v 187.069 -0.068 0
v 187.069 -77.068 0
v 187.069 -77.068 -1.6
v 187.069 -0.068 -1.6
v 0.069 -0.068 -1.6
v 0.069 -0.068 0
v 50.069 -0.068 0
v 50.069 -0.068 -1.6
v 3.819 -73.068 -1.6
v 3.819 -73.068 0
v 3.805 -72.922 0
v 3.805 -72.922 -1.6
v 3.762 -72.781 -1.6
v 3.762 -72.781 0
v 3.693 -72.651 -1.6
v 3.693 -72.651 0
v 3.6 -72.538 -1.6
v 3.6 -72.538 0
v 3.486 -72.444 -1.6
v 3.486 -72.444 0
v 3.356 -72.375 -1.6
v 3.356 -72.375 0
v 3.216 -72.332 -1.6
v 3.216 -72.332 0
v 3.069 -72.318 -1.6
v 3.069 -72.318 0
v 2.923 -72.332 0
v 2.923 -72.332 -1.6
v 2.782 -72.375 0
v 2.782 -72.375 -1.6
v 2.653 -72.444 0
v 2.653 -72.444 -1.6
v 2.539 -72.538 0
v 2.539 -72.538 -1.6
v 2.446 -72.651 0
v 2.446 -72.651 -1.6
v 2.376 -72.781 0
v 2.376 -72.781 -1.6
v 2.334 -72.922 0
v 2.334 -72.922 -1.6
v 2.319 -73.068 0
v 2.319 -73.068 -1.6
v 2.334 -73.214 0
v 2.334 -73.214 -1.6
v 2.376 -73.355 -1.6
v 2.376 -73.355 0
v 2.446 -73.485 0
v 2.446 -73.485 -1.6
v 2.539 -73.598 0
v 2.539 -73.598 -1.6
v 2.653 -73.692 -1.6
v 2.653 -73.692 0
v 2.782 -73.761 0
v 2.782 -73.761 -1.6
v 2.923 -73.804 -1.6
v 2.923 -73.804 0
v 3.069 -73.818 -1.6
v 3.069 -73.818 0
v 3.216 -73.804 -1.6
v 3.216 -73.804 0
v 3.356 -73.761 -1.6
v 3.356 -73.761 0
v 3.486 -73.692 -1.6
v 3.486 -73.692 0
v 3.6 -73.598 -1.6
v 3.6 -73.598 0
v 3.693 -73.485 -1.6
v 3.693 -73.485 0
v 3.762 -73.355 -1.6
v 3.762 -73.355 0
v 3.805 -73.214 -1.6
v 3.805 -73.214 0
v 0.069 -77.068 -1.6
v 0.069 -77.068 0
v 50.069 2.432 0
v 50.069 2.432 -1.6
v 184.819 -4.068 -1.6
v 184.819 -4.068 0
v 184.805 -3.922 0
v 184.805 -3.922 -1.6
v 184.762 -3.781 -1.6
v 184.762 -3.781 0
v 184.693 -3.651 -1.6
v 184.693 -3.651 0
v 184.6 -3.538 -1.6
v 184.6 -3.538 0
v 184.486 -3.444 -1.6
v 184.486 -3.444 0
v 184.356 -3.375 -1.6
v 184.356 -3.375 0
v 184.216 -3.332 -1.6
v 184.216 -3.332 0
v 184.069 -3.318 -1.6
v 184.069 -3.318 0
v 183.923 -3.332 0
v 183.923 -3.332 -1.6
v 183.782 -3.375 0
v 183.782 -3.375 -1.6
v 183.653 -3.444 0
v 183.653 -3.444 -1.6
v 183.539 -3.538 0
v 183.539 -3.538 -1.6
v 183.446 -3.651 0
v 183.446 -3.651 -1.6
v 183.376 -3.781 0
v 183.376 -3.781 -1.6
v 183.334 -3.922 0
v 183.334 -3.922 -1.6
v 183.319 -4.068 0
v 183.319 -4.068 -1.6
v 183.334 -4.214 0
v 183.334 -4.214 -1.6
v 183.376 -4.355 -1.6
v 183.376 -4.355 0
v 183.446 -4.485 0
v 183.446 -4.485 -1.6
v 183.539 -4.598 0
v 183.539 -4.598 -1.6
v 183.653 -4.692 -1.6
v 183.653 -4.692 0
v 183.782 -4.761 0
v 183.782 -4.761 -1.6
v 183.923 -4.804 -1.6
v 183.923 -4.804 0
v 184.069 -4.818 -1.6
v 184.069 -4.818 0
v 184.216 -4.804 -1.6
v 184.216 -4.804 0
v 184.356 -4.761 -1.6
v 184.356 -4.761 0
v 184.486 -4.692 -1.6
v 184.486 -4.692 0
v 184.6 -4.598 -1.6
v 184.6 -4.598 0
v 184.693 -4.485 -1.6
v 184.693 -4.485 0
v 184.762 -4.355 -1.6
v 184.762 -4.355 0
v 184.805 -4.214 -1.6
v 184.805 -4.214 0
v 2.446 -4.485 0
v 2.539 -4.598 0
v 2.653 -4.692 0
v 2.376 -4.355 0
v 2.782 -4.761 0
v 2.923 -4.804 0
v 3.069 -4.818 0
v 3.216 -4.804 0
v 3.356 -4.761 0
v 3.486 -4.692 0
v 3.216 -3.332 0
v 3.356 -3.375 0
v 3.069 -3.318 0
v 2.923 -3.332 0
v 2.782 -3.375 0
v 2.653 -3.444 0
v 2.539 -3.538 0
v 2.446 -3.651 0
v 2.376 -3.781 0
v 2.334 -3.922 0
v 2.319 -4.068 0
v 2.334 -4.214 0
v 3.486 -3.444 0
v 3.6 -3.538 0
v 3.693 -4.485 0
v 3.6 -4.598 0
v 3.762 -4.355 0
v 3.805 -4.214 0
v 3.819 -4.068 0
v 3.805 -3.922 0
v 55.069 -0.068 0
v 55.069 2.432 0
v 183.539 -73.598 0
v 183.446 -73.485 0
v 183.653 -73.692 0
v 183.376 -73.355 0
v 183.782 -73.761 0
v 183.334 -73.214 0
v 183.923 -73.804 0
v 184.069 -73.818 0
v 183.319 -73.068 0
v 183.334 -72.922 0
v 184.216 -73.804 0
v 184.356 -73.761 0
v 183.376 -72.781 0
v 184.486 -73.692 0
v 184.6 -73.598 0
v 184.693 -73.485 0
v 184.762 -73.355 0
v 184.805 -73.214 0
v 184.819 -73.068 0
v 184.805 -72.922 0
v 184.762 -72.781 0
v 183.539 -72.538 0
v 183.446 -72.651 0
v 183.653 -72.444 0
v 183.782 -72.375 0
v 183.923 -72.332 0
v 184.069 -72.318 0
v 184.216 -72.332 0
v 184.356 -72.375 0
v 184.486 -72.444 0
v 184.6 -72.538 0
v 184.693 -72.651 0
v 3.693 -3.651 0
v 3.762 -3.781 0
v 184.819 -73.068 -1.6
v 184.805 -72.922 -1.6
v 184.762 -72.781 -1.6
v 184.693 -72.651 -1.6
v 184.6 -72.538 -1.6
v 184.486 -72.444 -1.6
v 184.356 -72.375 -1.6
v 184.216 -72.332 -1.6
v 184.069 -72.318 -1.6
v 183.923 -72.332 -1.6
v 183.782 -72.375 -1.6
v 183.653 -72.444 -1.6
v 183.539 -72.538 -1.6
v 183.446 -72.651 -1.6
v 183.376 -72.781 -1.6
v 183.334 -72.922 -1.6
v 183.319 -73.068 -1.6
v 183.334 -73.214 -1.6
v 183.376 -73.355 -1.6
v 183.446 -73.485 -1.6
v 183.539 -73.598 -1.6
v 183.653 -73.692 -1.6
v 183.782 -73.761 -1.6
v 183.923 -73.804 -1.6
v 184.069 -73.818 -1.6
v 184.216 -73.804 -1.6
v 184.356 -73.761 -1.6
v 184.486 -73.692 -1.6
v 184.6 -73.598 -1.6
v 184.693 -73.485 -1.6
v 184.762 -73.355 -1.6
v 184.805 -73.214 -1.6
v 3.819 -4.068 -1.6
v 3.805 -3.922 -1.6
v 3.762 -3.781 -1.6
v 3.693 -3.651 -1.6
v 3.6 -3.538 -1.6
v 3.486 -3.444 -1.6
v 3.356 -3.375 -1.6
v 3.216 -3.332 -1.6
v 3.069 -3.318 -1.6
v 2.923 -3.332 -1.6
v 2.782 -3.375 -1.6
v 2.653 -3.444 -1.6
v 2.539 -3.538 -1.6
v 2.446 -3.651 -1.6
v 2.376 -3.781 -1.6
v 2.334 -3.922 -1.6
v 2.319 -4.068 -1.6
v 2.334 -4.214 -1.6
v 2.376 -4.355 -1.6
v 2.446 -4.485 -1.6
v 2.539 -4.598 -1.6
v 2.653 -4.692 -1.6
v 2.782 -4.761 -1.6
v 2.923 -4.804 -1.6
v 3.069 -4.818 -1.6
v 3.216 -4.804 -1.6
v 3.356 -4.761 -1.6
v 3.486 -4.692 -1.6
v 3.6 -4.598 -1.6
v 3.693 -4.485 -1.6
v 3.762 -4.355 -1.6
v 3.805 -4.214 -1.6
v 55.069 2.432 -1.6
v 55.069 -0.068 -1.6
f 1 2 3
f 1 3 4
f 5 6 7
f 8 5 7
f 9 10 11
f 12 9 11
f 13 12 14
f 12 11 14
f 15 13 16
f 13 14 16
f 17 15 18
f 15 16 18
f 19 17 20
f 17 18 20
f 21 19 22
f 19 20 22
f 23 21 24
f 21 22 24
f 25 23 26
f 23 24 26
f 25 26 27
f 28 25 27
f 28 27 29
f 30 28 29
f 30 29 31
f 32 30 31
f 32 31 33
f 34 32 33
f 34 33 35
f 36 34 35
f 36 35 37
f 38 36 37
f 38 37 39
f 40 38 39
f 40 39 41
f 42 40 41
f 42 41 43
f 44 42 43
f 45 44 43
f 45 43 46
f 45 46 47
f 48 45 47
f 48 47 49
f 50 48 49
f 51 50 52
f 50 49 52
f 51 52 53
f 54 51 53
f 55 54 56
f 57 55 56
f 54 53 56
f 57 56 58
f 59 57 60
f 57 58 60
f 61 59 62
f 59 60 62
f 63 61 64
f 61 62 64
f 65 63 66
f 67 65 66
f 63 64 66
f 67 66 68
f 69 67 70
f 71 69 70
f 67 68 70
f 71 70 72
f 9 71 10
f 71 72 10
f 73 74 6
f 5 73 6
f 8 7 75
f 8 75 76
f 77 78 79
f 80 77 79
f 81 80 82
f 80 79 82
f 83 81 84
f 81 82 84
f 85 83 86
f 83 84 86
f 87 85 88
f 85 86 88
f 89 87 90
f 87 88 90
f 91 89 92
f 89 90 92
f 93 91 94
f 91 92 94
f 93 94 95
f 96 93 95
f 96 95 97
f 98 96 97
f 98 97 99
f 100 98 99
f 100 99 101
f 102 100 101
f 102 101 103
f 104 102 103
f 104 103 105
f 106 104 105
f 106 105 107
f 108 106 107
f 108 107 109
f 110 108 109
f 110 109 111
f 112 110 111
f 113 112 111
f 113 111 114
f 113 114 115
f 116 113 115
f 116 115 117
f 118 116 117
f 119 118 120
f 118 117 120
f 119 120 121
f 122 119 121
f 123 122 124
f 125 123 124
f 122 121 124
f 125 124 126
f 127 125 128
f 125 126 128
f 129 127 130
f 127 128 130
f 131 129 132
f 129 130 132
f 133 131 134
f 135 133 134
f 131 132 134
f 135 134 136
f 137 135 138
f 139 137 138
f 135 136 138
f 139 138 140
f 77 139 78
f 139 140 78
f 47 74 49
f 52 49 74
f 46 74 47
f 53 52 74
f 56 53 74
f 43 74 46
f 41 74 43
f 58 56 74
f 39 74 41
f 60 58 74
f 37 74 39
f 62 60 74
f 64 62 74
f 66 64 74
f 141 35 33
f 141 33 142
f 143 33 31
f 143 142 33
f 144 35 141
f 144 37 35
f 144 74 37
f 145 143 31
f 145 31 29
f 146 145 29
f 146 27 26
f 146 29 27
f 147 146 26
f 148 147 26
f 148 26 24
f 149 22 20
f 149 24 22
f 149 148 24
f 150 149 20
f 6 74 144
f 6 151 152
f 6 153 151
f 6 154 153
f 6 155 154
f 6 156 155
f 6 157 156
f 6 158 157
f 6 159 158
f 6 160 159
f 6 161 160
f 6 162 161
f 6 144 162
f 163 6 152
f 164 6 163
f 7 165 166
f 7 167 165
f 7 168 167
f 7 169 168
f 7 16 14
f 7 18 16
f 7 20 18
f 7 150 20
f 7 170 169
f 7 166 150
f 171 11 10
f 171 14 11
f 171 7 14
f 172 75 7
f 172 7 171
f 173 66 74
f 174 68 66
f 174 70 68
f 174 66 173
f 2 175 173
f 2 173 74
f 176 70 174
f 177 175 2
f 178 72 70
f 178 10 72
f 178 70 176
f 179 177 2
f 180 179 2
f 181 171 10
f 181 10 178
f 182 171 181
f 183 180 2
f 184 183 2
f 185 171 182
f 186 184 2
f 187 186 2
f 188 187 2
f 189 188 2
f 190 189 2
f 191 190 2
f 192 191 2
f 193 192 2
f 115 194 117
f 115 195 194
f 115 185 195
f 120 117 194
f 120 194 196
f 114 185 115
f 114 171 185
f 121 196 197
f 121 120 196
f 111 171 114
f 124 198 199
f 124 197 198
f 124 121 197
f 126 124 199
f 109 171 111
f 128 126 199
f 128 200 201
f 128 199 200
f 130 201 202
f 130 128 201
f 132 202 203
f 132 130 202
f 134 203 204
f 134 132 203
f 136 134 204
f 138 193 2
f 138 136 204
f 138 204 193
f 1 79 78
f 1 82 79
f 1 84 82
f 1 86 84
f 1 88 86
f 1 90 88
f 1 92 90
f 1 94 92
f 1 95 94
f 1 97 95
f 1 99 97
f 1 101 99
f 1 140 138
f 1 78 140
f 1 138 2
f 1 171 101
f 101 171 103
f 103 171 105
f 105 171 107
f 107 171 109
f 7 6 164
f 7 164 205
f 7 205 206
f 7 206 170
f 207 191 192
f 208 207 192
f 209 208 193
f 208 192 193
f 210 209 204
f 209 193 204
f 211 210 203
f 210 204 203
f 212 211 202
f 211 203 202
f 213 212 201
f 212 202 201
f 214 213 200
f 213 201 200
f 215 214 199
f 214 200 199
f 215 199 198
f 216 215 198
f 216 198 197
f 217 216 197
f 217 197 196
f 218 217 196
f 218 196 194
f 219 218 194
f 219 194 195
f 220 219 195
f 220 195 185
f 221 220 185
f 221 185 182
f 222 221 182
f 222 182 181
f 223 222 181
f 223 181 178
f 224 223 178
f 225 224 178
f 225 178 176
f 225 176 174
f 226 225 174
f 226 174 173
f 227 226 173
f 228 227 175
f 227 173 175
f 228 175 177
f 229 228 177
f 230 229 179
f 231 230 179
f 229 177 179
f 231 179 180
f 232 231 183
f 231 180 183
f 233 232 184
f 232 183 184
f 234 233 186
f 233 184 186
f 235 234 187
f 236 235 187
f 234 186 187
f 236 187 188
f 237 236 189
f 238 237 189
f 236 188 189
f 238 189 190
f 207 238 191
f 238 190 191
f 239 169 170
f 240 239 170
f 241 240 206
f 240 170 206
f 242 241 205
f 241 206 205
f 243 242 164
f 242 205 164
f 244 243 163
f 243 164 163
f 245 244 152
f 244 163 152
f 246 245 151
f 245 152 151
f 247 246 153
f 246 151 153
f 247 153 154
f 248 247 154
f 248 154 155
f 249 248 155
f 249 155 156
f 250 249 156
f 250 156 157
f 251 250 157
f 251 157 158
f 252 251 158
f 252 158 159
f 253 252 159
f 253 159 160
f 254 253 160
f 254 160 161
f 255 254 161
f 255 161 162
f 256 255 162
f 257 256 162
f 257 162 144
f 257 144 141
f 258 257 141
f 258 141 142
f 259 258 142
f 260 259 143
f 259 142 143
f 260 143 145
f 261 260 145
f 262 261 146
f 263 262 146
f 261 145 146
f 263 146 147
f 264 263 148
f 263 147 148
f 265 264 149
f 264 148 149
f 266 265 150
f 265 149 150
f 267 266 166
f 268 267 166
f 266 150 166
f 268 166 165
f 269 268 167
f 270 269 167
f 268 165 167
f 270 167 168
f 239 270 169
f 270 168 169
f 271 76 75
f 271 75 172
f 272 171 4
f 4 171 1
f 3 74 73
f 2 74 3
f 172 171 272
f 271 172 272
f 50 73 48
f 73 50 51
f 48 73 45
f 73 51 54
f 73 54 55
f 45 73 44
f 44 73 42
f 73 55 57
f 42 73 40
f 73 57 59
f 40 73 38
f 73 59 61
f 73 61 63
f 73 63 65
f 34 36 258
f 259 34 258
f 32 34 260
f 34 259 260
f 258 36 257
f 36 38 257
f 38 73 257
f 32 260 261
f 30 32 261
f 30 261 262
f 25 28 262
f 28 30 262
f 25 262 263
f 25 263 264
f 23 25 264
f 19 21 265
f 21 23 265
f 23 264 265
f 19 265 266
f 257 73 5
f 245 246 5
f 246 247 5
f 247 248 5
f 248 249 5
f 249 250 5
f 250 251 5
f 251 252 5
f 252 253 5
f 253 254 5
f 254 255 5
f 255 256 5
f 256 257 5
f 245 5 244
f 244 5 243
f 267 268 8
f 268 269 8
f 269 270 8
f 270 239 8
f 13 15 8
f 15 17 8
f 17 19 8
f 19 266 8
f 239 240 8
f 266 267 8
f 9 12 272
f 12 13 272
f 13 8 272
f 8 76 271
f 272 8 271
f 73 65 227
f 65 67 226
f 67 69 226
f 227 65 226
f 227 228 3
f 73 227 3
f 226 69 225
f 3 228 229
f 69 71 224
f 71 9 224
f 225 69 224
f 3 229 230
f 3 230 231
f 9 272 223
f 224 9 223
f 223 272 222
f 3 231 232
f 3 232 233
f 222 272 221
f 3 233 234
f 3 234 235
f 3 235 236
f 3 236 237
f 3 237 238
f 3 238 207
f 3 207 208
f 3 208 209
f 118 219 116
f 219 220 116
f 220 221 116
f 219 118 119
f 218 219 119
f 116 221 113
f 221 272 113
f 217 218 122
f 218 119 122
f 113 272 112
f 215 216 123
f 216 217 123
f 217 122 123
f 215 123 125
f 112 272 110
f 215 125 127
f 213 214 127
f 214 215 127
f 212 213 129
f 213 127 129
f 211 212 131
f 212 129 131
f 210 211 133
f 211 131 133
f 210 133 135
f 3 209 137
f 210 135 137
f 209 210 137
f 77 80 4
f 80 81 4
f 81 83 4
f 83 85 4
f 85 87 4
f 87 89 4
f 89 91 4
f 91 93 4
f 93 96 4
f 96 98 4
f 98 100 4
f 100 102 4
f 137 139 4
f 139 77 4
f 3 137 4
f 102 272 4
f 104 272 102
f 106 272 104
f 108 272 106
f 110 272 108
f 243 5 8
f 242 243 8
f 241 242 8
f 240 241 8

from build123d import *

# Parameters (mm, degrees)
KEEPOUTLAYER_W      = 186.9999816
KEEPOUTLAYER_H      = 76.9999984
EXTRUDE_1_DEPTH     = 1.6
VIAHOLELAYER_R      = 0.7499985
CUT_EXTRUDE_1_DEPTH = 2.6
SKETCH_2_W          = 5
SKETCH_2_H          = 1.6
EXTRUDE_3_DEPTH     = 2.5


with BuildPart() as part:
    # KeepOutLayer → Бобышка-Вытянуть1 (new body)
    with BuildSketch(Plane.XY):
        with Locations((93.56941662, -38.56797722)):
            Rectangle(KEEPOUTLAYER_W, KEEPOUTLAYER_H)
    extrude(amount=-EXTRUDE_1_DEPTH)

    # ViaHoleLayer → Вырез-Вытянуть1 (cut, through all)
    with BuildSketch(Plane.XY):
        with Locations((3.0693995, -73.06799966)):
            Circle(VIAHOLELAYER_R)
        with Locations((3.0693995, -4.0680005)):
            Circle(VIAHOLELAYER_R)
        with Locations((184.06940072, -73.06799966)):
            Circle(VIAHOLELAYER_R)
        with Locations((184.06940072, -4.0680005)):
            Circle(VIAHOLELAYER_R)
    extrude(amount=-CUT_EXTRUDE_1_DEPTH, mode=Mode.SUBTRACT)

    # Эскиз2 → Бобышка-Вытянуть3 (add)
    with BuildSketch(Plane(origin=(0, -0.06797802, 0), x_dir=(1, 0, 0), z_dir=(0, 1, 0))):
        with Locations((52.56942582, 0.8)):
            Rectangle(SKETCH_2_W, SKETCH_2_H)
    extrude(amount=EXTRUDE_3_DEPTH)


solid = part.part
